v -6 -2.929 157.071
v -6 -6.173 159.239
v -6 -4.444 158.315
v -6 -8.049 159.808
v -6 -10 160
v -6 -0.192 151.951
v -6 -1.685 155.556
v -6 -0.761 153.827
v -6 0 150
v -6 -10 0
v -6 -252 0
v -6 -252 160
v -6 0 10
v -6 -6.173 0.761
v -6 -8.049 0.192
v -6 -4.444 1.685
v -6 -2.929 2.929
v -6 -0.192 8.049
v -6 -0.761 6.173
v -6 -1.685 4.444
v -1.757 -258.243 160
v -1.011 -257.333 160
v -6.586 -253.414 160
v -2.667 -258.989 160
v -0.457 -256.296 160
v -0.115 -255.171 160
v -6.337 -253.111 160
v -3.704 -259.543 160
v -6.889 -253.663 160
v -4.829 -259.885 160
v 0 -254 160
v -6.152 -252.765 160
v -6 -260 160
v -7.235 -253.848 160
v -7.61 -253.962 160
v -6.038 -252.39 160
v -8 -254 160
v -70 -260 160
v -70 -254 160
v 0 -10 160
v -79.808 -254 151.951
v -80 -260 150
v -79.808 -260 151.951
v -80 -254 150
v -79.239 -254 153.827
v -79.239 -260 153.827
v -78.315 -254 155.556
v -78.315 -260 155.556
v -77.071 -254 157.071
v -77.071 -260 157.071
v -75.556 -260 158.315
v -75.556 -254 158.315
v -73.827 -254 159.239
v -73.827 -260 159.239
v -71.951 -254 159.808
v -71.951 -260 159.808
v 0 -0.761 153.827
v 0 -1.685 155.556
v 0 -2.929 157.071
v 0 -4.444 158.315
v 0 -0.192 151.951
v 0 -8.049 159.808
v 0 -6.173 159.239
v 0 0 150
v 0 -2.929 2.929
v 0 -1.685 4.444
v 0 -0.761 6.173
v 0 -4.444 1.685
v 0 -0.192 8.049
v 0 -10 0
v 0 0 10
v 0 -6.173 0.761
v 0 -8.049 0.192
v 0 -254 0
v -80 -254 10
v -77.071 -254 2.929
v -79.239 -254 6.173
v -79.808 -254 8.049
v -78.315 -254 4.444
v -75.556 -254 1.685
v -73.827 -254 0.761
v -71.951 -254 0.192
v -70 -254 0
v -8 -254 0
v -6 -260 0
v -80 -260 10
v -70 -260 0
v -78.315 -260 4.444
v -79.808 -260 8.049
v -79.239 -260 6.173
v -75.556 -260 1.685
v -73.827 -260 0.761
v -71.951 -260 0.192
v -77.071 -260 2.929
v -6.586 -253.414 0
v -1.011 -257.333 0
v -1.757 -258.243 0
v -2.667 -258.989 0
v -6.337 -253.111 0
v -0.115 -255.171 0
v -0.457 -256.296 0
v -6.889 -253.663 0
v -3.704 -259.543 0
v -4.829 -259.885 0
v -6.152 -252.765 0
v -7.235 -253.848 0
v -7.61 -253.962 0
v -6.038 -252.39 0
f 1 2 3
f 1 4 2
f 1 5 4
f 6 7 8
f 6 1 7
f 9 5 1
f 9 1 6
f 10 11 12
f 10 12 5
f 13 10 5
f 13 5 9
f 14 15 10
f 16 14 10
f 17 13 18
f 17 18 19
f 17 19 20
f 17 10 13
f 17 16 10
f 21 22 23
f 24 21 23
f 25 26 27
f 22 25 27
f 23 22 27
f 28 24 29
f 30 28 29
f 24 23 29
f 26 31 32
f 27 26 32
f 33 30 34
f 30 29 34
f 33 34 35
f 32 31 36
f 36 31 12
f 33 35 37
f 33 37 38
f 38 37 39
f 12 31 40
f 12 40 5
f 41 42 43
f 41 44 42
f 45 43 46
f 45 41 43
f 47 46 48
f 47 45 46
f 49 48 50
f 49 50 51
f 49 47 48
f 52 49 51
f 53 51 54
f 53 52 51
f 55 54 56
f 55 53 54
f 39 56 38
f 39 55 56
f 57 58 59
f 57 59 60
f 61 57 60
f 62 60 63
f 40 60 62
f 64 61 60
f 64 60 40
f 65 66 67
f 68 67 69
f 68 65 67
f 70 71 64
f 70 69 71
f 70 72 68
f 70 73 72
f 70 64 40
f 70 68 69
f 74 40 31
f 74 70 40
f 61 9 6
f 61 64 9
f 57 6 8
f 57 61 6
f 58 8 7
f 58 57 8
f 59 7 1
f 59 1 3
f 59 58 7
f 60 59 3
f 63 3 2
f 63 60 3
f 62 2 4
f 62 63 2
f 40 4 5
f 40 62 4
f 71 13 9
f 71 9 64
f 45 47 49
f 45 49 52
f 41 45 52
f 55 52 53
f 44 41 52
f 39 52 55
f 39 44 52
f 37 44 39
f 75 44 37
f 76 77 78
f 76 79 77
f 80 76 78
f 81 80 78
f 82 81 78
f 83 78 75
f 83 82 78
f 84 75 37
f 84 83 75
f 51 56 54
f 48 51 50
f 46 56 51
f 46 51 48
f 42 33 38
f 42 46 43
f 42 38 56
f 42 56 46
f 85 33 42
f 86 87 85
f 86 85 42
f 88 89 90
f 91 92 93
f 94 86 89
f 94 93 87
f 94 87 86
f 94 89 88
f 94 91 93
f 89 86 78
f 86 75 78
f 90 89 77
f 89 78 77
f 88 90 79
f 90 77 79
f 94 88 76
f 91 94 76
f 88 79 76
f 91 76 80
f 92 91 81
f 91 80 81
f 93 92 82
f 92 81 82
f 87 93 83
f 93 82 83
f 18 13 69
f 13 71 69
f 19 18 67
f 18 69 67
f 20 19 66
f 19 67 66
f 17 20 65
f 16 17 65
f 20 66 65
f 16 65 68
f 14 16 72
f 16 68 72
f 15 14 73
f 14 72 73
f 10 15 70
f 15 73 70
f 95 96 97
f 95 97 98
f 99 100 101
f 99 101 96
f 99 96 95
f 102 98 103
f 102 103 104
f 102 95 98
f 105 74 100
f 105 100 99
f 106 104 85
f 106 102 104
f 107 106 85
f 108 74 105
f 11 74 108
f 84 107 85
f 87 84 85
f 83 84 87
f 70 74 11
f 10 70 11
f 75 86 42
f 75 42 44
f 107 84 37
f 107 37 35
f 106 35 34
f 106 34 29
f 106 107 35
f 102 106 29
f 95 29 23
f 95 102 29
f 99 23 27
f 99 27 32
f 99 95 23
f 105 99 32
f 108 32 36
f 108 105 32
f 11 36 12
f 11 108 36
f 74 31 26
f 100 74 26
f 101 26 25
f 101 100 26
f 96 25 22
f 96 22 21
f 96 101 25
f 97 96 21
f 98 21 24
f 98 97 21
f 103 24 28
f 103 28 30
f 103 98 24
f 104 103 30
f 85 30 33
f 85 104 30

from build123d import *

# Parameters (mm, degrees)
BOSS_EXTRUDE1_DEPTH = 160
FILLET1_R           = 10


with BuildPart() as part:
    # Sketch1 → Boss-Extrude1 (new body)
    with BuildSketch(Plane.XY):
        with BuildLine():
            Line((0, 0), (0, -254))
            ThreePointArc((0, -254), (-1.757359313, -258.242640687), (-6, -260))
            Line((-6, -260), (-80, -260))
            Line((-80, -260), (-80, -254))
            Line((-80, -254), (-8, -254))
            ThreePointArc((-8, -254), (-6.585786438, -253.414213562), (-6, -252))
            Line((-6, -252), (-6, 0))
            Line((-6, 0), (0, 0))
        make_face()
    extrude(amount=BOSS_EXTRUDE1_DEPTH)

    # Fillet1
    fillet1_edges = [part.edges().sort_by_distance(p)[0] for p in [
        (-3, 0, 0),
        (-80, -257, 160),
        (-3, 0, 160),
        (-80, -257, 0),
    ]]
    fillet(fillet1_edges, radius=FILLET1_R)


solid = part.part
